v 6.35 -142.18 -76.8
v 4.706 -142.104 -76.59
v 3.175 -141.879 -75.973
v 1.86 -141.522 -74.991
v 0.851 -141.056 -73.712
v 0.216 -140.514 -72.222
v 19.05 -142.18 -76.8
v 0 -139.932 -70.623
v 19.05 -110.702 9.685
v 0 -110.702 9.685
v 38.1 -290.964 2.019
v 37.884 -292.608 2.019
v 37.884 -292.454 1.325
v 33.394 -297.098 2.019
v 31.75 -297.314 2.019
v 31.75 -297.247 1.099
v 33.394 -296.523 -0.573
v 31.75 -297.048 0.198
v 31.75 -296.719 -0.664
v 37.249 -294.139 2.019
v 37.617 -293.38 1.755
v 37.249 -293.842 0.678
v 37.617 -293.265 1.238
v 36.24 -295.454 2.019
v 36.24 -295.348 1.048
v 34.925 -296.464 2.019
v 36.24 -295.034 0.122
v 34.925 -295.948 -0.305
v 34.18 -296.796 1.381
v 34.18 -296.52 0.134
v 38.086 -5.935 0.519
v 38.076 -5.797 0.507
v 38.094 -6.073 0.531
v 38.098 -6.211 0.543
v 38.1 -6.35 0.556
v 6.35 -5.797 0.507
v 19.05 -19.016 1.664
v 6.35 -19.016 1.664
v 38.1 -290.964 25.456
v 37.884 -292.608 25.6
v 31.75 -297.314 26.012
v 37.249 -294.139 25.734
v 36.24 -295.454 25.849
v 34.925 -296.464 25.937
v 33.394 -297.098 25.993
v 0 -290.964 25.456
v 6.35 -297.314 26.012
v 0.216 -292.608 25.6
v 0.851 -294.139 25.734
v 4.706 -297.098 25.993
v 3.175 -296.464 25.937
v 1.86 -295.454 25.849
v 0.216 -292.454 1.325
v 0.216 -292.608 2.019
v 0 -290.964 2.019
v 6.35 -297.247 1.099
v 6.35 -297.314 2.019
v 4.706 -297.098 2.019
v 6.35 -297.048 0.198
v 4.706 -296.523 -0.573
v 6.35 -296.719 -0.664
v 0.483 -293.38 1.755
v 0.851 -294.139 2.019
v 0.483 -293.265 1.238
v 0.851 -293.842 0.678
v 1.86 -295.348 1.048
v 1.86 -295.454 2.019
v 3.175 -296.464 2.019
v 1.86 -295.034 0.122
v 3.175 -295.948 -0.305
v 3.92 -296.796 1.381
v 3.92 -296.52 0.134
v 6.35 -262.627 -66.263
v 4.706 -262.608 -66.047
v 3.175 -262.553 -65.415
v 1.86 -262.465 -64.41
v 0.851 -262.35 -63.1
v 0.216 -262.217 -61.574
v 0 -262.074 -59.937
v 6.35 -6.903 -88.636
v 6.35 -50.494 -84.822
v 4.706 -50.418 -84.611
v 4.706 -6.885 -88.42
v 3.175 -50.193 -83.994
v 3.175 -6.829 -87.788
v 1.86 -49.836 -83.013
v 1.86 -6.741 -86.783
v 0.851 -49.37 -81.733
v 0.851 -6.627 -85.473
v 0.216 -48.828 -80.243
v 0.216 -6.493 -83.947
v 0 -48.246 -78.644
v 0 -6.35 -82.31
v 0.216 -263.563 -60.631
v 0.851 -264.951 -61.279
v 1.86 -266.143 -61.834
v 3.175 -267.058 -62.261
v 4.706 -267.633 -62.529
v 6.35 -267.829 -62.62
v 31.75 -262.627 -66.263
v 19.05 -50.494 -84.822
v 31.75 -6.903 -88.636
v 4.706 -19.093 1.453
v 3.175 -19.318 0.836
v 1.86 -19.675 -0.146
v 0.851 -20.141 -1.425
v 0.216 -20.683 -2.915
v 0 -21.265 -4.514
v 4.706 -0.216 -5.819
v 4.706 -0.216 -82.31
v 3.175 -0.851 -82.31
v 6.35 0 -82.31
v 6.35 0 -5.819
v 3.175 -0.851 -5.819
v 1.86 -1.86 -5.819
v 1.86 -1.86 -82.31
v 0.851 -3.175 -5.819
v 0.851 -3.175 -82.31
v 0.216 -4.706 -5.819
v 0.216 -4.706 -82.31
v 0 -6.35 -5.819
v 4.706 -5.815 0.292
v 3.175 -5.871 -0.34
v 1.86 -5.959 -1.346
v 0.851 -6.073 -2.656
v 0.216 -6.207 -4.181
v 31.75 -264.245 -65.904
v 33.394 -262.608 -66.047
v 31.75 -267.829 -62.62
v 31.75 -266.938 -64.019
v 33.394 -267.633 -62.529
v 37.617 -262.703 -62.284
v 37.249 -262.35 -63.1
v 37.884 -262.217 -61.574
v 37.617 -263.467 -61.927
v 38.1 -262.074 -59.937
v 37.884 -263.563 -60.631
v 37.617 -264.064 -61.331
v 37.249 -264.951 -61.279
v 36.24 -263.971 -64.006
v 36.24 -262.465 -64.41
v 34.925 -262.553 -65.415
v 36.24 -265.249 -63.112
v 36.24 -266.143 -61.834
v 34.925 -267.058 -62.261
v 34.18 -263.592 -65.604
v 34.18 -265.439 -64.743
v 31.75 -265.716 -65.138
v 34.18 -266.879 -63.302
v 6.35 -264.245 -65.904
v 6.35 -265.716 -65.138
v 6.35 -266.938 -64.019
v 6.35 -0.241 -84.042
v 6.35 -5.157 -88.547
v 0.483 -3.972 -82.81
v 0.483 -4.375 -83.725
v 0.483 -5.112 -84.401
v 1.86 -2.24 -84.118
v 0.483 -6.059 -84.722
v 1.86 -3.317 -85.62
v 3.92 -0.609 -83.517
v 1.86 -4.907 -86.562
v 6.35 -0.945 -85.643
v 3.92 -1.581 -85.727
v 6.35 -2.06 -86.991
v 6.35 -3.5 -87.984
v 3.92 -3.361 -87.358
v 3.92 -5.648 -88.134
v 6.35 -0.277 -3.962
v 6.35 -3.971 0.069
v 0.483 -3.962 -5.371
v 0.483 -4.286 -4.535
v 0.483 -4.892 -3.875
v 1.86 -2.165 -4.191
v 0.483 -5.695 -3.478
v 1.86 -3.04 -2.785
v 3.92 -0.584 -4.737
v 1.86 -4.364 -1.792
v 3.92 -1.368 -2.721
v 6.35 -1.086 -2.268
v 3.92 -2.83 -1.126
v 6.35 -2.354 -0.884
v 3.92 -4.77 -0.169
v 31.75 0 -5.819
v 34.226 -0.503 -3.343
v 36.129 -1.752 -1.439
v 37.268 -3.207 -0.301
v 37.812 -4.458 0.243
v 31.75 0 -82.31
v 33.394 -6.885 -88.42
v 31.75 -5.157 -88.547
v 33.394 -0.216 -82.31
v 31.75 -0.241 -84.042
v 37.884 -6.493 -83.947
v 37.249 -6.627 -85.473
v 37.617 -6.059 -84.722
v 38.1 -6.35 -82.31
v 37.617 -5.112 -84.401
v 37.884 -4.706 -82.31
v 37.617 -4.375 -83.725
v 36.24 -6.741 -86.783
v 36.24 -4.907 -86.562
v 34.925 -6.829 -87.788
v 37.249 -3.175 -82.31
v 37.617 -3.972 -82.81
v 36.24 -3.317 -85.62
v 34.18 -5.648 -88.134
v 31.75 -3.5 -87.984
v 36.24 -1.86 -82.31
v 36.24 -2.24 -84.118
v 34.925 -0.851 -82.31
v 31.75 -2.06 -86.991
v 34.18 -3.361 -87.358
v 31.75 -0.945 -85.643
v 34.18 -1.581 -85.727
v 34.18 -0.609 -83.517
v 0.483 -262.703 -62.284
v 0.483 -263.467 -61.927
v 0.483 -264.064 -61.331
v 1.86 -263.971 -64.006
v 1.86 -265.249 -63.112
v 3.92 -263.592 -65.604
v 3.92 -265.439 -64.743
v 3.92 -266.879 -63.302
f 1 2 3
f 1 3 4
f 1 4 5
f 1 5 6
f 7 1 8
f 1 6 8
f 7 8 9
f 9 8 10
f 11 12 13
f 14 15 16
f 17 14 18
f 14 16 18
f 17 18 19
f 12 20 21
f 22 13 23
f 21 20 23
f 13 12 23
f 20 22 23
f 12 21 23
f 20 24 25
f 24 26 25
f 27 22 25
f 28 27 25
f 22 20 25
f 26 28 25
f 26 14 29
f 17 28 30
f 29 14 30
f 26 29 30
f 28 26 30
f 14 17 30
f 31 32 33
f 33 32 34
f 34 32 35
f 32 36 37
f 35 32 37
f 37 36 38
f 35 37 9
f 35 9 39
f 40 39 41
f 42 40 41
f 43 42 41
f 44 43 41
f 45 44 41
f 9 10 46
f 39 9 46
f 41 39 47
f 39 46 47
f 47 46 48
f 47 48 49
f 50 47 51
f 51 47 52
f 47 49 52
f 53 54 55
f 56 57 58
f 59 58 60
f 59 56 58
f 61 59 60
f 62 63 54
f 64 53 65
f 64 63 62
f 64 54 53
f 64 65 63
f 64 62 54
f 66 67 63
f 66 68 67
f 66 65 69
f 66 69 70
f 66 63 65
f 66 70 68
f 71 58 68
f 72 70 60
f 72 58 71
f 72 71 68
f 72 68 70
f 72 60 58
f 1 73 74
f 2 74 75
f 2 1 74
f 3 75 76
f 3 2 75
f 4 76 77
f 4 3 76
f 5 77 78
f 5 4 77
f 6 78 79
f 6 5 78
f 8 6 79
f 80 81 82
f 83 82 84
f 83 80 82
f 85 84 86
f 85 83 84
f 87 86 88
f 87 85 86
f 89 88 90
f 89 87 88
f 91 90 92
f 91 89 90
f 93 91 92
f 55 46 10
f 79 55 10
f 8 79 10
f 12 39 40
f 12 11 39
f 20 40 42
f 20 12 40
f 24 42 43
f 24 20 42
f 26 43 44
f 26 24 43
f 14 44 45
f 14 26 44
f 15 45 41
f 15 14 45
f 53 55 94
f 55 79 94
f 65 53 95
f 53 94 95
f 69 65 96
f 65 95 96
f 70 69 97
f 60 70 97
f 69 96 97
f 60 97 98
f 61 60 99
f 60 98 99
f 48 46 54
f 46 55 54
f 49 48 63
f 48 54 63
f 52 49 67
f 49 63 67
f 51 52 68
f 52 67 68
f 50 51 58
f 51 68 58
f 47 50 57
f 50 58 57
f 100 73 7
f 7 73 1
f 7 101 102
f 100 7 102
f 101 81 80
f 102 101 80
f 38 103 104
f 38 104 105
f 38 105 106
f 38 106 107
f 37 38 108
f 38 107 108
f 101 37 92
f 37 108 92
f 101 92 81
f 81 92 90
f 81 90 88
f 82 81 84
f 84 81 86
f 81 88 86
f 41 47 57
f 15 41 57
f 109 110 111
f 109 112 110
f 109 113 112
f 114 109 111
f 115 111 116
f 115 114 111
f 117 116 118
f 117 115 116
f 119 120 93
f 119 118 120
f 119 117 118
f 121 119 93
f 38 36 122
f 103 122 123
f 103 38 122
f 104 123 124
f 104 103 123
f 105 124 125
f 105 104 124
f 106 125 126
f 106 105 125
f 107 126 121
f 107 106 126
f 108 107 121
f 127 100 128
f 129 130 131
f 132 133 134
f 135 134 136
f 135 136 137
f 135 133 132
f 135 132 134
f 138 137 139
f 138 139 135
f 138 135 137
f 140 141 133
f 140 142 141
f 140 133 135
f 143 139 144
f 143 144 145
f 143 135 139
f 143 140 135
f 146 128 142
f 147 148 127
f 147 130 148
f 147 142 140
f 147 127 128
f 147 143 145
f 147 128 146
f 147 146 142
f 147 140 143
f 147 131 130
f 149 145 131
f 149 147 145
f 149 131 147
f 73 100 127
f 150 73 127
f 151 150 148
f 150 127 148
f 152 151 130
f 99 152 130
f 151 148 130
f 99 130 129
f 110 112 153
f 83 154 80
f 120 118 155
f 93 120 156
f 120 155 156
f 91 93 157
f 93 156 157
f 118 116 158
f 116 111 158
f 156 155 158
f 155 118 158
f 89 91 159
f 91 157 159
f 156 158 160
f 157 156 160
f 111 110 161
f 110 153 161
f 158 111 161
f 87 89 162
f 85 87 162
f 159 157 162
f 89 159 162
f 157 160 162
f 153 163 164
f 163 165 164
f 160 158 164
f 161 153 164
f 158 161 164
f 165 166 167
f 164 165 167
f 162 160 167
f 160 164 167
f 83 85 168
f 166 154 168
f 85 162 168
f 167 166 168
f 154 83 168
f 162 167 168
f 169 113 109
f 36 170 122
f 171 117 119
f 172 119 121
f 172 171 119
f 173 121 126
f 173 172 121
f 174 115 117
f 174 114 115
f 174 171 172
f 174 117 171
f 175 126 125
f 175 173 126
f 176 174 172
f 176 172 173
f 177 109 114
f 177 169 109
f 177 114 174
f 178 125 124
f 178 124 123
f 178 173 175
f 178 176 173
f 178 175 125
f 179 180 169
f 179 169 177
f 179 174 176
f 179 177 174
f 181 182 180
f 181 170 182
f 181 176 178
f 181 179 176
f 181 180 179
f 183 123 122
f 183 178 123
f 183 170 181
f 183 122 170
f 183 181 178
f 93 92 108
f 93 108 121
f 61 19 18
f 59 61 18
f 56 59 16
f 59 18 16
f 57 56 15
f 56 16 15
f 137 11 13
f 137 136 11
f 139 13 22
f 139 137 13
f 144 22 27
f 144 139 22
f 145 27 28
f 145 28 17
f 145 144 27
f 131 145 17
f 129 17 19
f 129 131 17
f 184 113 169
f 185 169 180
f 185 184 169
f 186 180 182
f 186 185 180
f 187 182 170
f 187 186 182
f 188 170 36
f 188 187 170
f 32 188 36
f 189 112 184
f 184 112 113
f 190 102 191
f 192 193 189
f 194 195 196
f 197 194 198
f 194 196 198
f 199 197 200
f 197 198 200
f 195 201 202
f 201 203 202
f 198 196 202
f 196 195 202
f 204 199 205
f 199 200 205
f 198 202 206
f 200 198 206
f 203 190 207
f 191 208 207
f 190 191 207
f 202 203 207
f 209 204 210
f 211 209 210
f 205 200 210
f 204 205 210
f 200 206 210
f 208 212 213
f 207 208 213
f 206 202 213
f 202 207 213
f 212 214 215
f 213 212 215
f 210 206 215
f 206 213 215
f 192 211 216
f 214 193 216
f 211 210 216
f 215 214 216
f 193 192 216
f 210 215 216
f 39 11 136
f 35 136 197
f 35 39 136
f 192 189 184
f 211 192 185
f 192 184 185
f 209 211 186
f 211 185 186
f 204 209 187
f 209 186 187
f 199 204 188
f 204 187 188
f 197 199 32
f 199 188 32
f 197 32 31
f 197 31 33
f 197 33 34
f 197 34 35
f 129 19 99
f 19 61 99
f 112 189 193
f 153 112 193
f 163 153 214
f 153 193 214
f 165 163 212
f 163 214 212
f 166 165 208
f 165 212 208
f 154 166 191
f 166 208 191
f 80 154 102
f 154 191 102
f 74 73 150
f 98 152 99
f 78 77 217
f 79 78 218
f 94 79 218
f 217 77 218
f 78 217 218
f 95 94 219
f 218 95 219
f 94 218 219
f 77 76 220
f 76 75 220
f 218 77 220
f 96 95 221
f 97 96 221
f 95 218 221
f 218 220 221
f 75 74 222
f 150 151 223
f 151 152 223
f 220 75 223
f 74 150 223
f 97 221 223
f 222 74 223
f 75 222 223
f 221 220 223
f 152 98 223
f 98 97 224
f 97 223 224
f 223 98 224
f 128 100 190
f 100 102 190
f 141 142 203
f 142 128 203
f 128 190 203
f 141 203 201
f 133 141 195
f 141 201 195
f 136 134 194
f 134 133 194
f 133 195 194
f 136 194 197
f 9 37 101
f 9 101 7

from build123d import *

# Parameters (mm, degrees)
F1_DEPTH = 38.1
F3_DEPTH = 19.05
F4_R     = 6.35


with BuildPart() as f1:
    # F0 (on Right) → F1 (new body)
    with BuildSketch(Plane.YZ):
        Polygon((0, -89.2395835576), (0, 0), (-297.3143076455, 26.011631423), (-297.3143076455, 0.611631423), (-266.2792969737, -65.9431637408), align=None)
    extrude(amount=F1_DEPTH)

    # F2 (on face) → F3 (cut)
    with BuildSketch(Plane(origin=(0, 0, 0), x_dir=(0, -1, 0), z_dir=(-1, 0, 0))):
        Polygon((110.7021358254, 9.6851819128), (19.016308353, 1.663711403), (50.4944921991, -84.8218879197), (142.1803196716, -76.8004174098), align=None)
    extrude(amount=-F3_DEPTH, mode=Mode.SUBTRACT)

    # F4
    f4_edges = [f1.edges().sort_by_distance(p)[0] for p in [
        (0, -297.314308, 13.311631),
        (38.1, -297.314308, 13.311631),
        (38.1, -281.796802, -32.665766),
        (0, -281.796802, -32.665766),
        (19.05, -266.279297, -65.943164),
        (38.1, -133.139648, -77.591374),
        (38.1, 0, -44.619792),
        (19.05, 0, 0),
        (0, -25.247246, -87.030736),
        (0, -204.229808, -71.371791),
        (19.05, 0, -89.239584),
        (0, 0, -44.619792),
        (0, -9.508154, 0.831856),
        (19.05, -297.314308, 0.611631),
    ]]
    fillet(f4_edges, radius=F4_R)


solid = f1.part
